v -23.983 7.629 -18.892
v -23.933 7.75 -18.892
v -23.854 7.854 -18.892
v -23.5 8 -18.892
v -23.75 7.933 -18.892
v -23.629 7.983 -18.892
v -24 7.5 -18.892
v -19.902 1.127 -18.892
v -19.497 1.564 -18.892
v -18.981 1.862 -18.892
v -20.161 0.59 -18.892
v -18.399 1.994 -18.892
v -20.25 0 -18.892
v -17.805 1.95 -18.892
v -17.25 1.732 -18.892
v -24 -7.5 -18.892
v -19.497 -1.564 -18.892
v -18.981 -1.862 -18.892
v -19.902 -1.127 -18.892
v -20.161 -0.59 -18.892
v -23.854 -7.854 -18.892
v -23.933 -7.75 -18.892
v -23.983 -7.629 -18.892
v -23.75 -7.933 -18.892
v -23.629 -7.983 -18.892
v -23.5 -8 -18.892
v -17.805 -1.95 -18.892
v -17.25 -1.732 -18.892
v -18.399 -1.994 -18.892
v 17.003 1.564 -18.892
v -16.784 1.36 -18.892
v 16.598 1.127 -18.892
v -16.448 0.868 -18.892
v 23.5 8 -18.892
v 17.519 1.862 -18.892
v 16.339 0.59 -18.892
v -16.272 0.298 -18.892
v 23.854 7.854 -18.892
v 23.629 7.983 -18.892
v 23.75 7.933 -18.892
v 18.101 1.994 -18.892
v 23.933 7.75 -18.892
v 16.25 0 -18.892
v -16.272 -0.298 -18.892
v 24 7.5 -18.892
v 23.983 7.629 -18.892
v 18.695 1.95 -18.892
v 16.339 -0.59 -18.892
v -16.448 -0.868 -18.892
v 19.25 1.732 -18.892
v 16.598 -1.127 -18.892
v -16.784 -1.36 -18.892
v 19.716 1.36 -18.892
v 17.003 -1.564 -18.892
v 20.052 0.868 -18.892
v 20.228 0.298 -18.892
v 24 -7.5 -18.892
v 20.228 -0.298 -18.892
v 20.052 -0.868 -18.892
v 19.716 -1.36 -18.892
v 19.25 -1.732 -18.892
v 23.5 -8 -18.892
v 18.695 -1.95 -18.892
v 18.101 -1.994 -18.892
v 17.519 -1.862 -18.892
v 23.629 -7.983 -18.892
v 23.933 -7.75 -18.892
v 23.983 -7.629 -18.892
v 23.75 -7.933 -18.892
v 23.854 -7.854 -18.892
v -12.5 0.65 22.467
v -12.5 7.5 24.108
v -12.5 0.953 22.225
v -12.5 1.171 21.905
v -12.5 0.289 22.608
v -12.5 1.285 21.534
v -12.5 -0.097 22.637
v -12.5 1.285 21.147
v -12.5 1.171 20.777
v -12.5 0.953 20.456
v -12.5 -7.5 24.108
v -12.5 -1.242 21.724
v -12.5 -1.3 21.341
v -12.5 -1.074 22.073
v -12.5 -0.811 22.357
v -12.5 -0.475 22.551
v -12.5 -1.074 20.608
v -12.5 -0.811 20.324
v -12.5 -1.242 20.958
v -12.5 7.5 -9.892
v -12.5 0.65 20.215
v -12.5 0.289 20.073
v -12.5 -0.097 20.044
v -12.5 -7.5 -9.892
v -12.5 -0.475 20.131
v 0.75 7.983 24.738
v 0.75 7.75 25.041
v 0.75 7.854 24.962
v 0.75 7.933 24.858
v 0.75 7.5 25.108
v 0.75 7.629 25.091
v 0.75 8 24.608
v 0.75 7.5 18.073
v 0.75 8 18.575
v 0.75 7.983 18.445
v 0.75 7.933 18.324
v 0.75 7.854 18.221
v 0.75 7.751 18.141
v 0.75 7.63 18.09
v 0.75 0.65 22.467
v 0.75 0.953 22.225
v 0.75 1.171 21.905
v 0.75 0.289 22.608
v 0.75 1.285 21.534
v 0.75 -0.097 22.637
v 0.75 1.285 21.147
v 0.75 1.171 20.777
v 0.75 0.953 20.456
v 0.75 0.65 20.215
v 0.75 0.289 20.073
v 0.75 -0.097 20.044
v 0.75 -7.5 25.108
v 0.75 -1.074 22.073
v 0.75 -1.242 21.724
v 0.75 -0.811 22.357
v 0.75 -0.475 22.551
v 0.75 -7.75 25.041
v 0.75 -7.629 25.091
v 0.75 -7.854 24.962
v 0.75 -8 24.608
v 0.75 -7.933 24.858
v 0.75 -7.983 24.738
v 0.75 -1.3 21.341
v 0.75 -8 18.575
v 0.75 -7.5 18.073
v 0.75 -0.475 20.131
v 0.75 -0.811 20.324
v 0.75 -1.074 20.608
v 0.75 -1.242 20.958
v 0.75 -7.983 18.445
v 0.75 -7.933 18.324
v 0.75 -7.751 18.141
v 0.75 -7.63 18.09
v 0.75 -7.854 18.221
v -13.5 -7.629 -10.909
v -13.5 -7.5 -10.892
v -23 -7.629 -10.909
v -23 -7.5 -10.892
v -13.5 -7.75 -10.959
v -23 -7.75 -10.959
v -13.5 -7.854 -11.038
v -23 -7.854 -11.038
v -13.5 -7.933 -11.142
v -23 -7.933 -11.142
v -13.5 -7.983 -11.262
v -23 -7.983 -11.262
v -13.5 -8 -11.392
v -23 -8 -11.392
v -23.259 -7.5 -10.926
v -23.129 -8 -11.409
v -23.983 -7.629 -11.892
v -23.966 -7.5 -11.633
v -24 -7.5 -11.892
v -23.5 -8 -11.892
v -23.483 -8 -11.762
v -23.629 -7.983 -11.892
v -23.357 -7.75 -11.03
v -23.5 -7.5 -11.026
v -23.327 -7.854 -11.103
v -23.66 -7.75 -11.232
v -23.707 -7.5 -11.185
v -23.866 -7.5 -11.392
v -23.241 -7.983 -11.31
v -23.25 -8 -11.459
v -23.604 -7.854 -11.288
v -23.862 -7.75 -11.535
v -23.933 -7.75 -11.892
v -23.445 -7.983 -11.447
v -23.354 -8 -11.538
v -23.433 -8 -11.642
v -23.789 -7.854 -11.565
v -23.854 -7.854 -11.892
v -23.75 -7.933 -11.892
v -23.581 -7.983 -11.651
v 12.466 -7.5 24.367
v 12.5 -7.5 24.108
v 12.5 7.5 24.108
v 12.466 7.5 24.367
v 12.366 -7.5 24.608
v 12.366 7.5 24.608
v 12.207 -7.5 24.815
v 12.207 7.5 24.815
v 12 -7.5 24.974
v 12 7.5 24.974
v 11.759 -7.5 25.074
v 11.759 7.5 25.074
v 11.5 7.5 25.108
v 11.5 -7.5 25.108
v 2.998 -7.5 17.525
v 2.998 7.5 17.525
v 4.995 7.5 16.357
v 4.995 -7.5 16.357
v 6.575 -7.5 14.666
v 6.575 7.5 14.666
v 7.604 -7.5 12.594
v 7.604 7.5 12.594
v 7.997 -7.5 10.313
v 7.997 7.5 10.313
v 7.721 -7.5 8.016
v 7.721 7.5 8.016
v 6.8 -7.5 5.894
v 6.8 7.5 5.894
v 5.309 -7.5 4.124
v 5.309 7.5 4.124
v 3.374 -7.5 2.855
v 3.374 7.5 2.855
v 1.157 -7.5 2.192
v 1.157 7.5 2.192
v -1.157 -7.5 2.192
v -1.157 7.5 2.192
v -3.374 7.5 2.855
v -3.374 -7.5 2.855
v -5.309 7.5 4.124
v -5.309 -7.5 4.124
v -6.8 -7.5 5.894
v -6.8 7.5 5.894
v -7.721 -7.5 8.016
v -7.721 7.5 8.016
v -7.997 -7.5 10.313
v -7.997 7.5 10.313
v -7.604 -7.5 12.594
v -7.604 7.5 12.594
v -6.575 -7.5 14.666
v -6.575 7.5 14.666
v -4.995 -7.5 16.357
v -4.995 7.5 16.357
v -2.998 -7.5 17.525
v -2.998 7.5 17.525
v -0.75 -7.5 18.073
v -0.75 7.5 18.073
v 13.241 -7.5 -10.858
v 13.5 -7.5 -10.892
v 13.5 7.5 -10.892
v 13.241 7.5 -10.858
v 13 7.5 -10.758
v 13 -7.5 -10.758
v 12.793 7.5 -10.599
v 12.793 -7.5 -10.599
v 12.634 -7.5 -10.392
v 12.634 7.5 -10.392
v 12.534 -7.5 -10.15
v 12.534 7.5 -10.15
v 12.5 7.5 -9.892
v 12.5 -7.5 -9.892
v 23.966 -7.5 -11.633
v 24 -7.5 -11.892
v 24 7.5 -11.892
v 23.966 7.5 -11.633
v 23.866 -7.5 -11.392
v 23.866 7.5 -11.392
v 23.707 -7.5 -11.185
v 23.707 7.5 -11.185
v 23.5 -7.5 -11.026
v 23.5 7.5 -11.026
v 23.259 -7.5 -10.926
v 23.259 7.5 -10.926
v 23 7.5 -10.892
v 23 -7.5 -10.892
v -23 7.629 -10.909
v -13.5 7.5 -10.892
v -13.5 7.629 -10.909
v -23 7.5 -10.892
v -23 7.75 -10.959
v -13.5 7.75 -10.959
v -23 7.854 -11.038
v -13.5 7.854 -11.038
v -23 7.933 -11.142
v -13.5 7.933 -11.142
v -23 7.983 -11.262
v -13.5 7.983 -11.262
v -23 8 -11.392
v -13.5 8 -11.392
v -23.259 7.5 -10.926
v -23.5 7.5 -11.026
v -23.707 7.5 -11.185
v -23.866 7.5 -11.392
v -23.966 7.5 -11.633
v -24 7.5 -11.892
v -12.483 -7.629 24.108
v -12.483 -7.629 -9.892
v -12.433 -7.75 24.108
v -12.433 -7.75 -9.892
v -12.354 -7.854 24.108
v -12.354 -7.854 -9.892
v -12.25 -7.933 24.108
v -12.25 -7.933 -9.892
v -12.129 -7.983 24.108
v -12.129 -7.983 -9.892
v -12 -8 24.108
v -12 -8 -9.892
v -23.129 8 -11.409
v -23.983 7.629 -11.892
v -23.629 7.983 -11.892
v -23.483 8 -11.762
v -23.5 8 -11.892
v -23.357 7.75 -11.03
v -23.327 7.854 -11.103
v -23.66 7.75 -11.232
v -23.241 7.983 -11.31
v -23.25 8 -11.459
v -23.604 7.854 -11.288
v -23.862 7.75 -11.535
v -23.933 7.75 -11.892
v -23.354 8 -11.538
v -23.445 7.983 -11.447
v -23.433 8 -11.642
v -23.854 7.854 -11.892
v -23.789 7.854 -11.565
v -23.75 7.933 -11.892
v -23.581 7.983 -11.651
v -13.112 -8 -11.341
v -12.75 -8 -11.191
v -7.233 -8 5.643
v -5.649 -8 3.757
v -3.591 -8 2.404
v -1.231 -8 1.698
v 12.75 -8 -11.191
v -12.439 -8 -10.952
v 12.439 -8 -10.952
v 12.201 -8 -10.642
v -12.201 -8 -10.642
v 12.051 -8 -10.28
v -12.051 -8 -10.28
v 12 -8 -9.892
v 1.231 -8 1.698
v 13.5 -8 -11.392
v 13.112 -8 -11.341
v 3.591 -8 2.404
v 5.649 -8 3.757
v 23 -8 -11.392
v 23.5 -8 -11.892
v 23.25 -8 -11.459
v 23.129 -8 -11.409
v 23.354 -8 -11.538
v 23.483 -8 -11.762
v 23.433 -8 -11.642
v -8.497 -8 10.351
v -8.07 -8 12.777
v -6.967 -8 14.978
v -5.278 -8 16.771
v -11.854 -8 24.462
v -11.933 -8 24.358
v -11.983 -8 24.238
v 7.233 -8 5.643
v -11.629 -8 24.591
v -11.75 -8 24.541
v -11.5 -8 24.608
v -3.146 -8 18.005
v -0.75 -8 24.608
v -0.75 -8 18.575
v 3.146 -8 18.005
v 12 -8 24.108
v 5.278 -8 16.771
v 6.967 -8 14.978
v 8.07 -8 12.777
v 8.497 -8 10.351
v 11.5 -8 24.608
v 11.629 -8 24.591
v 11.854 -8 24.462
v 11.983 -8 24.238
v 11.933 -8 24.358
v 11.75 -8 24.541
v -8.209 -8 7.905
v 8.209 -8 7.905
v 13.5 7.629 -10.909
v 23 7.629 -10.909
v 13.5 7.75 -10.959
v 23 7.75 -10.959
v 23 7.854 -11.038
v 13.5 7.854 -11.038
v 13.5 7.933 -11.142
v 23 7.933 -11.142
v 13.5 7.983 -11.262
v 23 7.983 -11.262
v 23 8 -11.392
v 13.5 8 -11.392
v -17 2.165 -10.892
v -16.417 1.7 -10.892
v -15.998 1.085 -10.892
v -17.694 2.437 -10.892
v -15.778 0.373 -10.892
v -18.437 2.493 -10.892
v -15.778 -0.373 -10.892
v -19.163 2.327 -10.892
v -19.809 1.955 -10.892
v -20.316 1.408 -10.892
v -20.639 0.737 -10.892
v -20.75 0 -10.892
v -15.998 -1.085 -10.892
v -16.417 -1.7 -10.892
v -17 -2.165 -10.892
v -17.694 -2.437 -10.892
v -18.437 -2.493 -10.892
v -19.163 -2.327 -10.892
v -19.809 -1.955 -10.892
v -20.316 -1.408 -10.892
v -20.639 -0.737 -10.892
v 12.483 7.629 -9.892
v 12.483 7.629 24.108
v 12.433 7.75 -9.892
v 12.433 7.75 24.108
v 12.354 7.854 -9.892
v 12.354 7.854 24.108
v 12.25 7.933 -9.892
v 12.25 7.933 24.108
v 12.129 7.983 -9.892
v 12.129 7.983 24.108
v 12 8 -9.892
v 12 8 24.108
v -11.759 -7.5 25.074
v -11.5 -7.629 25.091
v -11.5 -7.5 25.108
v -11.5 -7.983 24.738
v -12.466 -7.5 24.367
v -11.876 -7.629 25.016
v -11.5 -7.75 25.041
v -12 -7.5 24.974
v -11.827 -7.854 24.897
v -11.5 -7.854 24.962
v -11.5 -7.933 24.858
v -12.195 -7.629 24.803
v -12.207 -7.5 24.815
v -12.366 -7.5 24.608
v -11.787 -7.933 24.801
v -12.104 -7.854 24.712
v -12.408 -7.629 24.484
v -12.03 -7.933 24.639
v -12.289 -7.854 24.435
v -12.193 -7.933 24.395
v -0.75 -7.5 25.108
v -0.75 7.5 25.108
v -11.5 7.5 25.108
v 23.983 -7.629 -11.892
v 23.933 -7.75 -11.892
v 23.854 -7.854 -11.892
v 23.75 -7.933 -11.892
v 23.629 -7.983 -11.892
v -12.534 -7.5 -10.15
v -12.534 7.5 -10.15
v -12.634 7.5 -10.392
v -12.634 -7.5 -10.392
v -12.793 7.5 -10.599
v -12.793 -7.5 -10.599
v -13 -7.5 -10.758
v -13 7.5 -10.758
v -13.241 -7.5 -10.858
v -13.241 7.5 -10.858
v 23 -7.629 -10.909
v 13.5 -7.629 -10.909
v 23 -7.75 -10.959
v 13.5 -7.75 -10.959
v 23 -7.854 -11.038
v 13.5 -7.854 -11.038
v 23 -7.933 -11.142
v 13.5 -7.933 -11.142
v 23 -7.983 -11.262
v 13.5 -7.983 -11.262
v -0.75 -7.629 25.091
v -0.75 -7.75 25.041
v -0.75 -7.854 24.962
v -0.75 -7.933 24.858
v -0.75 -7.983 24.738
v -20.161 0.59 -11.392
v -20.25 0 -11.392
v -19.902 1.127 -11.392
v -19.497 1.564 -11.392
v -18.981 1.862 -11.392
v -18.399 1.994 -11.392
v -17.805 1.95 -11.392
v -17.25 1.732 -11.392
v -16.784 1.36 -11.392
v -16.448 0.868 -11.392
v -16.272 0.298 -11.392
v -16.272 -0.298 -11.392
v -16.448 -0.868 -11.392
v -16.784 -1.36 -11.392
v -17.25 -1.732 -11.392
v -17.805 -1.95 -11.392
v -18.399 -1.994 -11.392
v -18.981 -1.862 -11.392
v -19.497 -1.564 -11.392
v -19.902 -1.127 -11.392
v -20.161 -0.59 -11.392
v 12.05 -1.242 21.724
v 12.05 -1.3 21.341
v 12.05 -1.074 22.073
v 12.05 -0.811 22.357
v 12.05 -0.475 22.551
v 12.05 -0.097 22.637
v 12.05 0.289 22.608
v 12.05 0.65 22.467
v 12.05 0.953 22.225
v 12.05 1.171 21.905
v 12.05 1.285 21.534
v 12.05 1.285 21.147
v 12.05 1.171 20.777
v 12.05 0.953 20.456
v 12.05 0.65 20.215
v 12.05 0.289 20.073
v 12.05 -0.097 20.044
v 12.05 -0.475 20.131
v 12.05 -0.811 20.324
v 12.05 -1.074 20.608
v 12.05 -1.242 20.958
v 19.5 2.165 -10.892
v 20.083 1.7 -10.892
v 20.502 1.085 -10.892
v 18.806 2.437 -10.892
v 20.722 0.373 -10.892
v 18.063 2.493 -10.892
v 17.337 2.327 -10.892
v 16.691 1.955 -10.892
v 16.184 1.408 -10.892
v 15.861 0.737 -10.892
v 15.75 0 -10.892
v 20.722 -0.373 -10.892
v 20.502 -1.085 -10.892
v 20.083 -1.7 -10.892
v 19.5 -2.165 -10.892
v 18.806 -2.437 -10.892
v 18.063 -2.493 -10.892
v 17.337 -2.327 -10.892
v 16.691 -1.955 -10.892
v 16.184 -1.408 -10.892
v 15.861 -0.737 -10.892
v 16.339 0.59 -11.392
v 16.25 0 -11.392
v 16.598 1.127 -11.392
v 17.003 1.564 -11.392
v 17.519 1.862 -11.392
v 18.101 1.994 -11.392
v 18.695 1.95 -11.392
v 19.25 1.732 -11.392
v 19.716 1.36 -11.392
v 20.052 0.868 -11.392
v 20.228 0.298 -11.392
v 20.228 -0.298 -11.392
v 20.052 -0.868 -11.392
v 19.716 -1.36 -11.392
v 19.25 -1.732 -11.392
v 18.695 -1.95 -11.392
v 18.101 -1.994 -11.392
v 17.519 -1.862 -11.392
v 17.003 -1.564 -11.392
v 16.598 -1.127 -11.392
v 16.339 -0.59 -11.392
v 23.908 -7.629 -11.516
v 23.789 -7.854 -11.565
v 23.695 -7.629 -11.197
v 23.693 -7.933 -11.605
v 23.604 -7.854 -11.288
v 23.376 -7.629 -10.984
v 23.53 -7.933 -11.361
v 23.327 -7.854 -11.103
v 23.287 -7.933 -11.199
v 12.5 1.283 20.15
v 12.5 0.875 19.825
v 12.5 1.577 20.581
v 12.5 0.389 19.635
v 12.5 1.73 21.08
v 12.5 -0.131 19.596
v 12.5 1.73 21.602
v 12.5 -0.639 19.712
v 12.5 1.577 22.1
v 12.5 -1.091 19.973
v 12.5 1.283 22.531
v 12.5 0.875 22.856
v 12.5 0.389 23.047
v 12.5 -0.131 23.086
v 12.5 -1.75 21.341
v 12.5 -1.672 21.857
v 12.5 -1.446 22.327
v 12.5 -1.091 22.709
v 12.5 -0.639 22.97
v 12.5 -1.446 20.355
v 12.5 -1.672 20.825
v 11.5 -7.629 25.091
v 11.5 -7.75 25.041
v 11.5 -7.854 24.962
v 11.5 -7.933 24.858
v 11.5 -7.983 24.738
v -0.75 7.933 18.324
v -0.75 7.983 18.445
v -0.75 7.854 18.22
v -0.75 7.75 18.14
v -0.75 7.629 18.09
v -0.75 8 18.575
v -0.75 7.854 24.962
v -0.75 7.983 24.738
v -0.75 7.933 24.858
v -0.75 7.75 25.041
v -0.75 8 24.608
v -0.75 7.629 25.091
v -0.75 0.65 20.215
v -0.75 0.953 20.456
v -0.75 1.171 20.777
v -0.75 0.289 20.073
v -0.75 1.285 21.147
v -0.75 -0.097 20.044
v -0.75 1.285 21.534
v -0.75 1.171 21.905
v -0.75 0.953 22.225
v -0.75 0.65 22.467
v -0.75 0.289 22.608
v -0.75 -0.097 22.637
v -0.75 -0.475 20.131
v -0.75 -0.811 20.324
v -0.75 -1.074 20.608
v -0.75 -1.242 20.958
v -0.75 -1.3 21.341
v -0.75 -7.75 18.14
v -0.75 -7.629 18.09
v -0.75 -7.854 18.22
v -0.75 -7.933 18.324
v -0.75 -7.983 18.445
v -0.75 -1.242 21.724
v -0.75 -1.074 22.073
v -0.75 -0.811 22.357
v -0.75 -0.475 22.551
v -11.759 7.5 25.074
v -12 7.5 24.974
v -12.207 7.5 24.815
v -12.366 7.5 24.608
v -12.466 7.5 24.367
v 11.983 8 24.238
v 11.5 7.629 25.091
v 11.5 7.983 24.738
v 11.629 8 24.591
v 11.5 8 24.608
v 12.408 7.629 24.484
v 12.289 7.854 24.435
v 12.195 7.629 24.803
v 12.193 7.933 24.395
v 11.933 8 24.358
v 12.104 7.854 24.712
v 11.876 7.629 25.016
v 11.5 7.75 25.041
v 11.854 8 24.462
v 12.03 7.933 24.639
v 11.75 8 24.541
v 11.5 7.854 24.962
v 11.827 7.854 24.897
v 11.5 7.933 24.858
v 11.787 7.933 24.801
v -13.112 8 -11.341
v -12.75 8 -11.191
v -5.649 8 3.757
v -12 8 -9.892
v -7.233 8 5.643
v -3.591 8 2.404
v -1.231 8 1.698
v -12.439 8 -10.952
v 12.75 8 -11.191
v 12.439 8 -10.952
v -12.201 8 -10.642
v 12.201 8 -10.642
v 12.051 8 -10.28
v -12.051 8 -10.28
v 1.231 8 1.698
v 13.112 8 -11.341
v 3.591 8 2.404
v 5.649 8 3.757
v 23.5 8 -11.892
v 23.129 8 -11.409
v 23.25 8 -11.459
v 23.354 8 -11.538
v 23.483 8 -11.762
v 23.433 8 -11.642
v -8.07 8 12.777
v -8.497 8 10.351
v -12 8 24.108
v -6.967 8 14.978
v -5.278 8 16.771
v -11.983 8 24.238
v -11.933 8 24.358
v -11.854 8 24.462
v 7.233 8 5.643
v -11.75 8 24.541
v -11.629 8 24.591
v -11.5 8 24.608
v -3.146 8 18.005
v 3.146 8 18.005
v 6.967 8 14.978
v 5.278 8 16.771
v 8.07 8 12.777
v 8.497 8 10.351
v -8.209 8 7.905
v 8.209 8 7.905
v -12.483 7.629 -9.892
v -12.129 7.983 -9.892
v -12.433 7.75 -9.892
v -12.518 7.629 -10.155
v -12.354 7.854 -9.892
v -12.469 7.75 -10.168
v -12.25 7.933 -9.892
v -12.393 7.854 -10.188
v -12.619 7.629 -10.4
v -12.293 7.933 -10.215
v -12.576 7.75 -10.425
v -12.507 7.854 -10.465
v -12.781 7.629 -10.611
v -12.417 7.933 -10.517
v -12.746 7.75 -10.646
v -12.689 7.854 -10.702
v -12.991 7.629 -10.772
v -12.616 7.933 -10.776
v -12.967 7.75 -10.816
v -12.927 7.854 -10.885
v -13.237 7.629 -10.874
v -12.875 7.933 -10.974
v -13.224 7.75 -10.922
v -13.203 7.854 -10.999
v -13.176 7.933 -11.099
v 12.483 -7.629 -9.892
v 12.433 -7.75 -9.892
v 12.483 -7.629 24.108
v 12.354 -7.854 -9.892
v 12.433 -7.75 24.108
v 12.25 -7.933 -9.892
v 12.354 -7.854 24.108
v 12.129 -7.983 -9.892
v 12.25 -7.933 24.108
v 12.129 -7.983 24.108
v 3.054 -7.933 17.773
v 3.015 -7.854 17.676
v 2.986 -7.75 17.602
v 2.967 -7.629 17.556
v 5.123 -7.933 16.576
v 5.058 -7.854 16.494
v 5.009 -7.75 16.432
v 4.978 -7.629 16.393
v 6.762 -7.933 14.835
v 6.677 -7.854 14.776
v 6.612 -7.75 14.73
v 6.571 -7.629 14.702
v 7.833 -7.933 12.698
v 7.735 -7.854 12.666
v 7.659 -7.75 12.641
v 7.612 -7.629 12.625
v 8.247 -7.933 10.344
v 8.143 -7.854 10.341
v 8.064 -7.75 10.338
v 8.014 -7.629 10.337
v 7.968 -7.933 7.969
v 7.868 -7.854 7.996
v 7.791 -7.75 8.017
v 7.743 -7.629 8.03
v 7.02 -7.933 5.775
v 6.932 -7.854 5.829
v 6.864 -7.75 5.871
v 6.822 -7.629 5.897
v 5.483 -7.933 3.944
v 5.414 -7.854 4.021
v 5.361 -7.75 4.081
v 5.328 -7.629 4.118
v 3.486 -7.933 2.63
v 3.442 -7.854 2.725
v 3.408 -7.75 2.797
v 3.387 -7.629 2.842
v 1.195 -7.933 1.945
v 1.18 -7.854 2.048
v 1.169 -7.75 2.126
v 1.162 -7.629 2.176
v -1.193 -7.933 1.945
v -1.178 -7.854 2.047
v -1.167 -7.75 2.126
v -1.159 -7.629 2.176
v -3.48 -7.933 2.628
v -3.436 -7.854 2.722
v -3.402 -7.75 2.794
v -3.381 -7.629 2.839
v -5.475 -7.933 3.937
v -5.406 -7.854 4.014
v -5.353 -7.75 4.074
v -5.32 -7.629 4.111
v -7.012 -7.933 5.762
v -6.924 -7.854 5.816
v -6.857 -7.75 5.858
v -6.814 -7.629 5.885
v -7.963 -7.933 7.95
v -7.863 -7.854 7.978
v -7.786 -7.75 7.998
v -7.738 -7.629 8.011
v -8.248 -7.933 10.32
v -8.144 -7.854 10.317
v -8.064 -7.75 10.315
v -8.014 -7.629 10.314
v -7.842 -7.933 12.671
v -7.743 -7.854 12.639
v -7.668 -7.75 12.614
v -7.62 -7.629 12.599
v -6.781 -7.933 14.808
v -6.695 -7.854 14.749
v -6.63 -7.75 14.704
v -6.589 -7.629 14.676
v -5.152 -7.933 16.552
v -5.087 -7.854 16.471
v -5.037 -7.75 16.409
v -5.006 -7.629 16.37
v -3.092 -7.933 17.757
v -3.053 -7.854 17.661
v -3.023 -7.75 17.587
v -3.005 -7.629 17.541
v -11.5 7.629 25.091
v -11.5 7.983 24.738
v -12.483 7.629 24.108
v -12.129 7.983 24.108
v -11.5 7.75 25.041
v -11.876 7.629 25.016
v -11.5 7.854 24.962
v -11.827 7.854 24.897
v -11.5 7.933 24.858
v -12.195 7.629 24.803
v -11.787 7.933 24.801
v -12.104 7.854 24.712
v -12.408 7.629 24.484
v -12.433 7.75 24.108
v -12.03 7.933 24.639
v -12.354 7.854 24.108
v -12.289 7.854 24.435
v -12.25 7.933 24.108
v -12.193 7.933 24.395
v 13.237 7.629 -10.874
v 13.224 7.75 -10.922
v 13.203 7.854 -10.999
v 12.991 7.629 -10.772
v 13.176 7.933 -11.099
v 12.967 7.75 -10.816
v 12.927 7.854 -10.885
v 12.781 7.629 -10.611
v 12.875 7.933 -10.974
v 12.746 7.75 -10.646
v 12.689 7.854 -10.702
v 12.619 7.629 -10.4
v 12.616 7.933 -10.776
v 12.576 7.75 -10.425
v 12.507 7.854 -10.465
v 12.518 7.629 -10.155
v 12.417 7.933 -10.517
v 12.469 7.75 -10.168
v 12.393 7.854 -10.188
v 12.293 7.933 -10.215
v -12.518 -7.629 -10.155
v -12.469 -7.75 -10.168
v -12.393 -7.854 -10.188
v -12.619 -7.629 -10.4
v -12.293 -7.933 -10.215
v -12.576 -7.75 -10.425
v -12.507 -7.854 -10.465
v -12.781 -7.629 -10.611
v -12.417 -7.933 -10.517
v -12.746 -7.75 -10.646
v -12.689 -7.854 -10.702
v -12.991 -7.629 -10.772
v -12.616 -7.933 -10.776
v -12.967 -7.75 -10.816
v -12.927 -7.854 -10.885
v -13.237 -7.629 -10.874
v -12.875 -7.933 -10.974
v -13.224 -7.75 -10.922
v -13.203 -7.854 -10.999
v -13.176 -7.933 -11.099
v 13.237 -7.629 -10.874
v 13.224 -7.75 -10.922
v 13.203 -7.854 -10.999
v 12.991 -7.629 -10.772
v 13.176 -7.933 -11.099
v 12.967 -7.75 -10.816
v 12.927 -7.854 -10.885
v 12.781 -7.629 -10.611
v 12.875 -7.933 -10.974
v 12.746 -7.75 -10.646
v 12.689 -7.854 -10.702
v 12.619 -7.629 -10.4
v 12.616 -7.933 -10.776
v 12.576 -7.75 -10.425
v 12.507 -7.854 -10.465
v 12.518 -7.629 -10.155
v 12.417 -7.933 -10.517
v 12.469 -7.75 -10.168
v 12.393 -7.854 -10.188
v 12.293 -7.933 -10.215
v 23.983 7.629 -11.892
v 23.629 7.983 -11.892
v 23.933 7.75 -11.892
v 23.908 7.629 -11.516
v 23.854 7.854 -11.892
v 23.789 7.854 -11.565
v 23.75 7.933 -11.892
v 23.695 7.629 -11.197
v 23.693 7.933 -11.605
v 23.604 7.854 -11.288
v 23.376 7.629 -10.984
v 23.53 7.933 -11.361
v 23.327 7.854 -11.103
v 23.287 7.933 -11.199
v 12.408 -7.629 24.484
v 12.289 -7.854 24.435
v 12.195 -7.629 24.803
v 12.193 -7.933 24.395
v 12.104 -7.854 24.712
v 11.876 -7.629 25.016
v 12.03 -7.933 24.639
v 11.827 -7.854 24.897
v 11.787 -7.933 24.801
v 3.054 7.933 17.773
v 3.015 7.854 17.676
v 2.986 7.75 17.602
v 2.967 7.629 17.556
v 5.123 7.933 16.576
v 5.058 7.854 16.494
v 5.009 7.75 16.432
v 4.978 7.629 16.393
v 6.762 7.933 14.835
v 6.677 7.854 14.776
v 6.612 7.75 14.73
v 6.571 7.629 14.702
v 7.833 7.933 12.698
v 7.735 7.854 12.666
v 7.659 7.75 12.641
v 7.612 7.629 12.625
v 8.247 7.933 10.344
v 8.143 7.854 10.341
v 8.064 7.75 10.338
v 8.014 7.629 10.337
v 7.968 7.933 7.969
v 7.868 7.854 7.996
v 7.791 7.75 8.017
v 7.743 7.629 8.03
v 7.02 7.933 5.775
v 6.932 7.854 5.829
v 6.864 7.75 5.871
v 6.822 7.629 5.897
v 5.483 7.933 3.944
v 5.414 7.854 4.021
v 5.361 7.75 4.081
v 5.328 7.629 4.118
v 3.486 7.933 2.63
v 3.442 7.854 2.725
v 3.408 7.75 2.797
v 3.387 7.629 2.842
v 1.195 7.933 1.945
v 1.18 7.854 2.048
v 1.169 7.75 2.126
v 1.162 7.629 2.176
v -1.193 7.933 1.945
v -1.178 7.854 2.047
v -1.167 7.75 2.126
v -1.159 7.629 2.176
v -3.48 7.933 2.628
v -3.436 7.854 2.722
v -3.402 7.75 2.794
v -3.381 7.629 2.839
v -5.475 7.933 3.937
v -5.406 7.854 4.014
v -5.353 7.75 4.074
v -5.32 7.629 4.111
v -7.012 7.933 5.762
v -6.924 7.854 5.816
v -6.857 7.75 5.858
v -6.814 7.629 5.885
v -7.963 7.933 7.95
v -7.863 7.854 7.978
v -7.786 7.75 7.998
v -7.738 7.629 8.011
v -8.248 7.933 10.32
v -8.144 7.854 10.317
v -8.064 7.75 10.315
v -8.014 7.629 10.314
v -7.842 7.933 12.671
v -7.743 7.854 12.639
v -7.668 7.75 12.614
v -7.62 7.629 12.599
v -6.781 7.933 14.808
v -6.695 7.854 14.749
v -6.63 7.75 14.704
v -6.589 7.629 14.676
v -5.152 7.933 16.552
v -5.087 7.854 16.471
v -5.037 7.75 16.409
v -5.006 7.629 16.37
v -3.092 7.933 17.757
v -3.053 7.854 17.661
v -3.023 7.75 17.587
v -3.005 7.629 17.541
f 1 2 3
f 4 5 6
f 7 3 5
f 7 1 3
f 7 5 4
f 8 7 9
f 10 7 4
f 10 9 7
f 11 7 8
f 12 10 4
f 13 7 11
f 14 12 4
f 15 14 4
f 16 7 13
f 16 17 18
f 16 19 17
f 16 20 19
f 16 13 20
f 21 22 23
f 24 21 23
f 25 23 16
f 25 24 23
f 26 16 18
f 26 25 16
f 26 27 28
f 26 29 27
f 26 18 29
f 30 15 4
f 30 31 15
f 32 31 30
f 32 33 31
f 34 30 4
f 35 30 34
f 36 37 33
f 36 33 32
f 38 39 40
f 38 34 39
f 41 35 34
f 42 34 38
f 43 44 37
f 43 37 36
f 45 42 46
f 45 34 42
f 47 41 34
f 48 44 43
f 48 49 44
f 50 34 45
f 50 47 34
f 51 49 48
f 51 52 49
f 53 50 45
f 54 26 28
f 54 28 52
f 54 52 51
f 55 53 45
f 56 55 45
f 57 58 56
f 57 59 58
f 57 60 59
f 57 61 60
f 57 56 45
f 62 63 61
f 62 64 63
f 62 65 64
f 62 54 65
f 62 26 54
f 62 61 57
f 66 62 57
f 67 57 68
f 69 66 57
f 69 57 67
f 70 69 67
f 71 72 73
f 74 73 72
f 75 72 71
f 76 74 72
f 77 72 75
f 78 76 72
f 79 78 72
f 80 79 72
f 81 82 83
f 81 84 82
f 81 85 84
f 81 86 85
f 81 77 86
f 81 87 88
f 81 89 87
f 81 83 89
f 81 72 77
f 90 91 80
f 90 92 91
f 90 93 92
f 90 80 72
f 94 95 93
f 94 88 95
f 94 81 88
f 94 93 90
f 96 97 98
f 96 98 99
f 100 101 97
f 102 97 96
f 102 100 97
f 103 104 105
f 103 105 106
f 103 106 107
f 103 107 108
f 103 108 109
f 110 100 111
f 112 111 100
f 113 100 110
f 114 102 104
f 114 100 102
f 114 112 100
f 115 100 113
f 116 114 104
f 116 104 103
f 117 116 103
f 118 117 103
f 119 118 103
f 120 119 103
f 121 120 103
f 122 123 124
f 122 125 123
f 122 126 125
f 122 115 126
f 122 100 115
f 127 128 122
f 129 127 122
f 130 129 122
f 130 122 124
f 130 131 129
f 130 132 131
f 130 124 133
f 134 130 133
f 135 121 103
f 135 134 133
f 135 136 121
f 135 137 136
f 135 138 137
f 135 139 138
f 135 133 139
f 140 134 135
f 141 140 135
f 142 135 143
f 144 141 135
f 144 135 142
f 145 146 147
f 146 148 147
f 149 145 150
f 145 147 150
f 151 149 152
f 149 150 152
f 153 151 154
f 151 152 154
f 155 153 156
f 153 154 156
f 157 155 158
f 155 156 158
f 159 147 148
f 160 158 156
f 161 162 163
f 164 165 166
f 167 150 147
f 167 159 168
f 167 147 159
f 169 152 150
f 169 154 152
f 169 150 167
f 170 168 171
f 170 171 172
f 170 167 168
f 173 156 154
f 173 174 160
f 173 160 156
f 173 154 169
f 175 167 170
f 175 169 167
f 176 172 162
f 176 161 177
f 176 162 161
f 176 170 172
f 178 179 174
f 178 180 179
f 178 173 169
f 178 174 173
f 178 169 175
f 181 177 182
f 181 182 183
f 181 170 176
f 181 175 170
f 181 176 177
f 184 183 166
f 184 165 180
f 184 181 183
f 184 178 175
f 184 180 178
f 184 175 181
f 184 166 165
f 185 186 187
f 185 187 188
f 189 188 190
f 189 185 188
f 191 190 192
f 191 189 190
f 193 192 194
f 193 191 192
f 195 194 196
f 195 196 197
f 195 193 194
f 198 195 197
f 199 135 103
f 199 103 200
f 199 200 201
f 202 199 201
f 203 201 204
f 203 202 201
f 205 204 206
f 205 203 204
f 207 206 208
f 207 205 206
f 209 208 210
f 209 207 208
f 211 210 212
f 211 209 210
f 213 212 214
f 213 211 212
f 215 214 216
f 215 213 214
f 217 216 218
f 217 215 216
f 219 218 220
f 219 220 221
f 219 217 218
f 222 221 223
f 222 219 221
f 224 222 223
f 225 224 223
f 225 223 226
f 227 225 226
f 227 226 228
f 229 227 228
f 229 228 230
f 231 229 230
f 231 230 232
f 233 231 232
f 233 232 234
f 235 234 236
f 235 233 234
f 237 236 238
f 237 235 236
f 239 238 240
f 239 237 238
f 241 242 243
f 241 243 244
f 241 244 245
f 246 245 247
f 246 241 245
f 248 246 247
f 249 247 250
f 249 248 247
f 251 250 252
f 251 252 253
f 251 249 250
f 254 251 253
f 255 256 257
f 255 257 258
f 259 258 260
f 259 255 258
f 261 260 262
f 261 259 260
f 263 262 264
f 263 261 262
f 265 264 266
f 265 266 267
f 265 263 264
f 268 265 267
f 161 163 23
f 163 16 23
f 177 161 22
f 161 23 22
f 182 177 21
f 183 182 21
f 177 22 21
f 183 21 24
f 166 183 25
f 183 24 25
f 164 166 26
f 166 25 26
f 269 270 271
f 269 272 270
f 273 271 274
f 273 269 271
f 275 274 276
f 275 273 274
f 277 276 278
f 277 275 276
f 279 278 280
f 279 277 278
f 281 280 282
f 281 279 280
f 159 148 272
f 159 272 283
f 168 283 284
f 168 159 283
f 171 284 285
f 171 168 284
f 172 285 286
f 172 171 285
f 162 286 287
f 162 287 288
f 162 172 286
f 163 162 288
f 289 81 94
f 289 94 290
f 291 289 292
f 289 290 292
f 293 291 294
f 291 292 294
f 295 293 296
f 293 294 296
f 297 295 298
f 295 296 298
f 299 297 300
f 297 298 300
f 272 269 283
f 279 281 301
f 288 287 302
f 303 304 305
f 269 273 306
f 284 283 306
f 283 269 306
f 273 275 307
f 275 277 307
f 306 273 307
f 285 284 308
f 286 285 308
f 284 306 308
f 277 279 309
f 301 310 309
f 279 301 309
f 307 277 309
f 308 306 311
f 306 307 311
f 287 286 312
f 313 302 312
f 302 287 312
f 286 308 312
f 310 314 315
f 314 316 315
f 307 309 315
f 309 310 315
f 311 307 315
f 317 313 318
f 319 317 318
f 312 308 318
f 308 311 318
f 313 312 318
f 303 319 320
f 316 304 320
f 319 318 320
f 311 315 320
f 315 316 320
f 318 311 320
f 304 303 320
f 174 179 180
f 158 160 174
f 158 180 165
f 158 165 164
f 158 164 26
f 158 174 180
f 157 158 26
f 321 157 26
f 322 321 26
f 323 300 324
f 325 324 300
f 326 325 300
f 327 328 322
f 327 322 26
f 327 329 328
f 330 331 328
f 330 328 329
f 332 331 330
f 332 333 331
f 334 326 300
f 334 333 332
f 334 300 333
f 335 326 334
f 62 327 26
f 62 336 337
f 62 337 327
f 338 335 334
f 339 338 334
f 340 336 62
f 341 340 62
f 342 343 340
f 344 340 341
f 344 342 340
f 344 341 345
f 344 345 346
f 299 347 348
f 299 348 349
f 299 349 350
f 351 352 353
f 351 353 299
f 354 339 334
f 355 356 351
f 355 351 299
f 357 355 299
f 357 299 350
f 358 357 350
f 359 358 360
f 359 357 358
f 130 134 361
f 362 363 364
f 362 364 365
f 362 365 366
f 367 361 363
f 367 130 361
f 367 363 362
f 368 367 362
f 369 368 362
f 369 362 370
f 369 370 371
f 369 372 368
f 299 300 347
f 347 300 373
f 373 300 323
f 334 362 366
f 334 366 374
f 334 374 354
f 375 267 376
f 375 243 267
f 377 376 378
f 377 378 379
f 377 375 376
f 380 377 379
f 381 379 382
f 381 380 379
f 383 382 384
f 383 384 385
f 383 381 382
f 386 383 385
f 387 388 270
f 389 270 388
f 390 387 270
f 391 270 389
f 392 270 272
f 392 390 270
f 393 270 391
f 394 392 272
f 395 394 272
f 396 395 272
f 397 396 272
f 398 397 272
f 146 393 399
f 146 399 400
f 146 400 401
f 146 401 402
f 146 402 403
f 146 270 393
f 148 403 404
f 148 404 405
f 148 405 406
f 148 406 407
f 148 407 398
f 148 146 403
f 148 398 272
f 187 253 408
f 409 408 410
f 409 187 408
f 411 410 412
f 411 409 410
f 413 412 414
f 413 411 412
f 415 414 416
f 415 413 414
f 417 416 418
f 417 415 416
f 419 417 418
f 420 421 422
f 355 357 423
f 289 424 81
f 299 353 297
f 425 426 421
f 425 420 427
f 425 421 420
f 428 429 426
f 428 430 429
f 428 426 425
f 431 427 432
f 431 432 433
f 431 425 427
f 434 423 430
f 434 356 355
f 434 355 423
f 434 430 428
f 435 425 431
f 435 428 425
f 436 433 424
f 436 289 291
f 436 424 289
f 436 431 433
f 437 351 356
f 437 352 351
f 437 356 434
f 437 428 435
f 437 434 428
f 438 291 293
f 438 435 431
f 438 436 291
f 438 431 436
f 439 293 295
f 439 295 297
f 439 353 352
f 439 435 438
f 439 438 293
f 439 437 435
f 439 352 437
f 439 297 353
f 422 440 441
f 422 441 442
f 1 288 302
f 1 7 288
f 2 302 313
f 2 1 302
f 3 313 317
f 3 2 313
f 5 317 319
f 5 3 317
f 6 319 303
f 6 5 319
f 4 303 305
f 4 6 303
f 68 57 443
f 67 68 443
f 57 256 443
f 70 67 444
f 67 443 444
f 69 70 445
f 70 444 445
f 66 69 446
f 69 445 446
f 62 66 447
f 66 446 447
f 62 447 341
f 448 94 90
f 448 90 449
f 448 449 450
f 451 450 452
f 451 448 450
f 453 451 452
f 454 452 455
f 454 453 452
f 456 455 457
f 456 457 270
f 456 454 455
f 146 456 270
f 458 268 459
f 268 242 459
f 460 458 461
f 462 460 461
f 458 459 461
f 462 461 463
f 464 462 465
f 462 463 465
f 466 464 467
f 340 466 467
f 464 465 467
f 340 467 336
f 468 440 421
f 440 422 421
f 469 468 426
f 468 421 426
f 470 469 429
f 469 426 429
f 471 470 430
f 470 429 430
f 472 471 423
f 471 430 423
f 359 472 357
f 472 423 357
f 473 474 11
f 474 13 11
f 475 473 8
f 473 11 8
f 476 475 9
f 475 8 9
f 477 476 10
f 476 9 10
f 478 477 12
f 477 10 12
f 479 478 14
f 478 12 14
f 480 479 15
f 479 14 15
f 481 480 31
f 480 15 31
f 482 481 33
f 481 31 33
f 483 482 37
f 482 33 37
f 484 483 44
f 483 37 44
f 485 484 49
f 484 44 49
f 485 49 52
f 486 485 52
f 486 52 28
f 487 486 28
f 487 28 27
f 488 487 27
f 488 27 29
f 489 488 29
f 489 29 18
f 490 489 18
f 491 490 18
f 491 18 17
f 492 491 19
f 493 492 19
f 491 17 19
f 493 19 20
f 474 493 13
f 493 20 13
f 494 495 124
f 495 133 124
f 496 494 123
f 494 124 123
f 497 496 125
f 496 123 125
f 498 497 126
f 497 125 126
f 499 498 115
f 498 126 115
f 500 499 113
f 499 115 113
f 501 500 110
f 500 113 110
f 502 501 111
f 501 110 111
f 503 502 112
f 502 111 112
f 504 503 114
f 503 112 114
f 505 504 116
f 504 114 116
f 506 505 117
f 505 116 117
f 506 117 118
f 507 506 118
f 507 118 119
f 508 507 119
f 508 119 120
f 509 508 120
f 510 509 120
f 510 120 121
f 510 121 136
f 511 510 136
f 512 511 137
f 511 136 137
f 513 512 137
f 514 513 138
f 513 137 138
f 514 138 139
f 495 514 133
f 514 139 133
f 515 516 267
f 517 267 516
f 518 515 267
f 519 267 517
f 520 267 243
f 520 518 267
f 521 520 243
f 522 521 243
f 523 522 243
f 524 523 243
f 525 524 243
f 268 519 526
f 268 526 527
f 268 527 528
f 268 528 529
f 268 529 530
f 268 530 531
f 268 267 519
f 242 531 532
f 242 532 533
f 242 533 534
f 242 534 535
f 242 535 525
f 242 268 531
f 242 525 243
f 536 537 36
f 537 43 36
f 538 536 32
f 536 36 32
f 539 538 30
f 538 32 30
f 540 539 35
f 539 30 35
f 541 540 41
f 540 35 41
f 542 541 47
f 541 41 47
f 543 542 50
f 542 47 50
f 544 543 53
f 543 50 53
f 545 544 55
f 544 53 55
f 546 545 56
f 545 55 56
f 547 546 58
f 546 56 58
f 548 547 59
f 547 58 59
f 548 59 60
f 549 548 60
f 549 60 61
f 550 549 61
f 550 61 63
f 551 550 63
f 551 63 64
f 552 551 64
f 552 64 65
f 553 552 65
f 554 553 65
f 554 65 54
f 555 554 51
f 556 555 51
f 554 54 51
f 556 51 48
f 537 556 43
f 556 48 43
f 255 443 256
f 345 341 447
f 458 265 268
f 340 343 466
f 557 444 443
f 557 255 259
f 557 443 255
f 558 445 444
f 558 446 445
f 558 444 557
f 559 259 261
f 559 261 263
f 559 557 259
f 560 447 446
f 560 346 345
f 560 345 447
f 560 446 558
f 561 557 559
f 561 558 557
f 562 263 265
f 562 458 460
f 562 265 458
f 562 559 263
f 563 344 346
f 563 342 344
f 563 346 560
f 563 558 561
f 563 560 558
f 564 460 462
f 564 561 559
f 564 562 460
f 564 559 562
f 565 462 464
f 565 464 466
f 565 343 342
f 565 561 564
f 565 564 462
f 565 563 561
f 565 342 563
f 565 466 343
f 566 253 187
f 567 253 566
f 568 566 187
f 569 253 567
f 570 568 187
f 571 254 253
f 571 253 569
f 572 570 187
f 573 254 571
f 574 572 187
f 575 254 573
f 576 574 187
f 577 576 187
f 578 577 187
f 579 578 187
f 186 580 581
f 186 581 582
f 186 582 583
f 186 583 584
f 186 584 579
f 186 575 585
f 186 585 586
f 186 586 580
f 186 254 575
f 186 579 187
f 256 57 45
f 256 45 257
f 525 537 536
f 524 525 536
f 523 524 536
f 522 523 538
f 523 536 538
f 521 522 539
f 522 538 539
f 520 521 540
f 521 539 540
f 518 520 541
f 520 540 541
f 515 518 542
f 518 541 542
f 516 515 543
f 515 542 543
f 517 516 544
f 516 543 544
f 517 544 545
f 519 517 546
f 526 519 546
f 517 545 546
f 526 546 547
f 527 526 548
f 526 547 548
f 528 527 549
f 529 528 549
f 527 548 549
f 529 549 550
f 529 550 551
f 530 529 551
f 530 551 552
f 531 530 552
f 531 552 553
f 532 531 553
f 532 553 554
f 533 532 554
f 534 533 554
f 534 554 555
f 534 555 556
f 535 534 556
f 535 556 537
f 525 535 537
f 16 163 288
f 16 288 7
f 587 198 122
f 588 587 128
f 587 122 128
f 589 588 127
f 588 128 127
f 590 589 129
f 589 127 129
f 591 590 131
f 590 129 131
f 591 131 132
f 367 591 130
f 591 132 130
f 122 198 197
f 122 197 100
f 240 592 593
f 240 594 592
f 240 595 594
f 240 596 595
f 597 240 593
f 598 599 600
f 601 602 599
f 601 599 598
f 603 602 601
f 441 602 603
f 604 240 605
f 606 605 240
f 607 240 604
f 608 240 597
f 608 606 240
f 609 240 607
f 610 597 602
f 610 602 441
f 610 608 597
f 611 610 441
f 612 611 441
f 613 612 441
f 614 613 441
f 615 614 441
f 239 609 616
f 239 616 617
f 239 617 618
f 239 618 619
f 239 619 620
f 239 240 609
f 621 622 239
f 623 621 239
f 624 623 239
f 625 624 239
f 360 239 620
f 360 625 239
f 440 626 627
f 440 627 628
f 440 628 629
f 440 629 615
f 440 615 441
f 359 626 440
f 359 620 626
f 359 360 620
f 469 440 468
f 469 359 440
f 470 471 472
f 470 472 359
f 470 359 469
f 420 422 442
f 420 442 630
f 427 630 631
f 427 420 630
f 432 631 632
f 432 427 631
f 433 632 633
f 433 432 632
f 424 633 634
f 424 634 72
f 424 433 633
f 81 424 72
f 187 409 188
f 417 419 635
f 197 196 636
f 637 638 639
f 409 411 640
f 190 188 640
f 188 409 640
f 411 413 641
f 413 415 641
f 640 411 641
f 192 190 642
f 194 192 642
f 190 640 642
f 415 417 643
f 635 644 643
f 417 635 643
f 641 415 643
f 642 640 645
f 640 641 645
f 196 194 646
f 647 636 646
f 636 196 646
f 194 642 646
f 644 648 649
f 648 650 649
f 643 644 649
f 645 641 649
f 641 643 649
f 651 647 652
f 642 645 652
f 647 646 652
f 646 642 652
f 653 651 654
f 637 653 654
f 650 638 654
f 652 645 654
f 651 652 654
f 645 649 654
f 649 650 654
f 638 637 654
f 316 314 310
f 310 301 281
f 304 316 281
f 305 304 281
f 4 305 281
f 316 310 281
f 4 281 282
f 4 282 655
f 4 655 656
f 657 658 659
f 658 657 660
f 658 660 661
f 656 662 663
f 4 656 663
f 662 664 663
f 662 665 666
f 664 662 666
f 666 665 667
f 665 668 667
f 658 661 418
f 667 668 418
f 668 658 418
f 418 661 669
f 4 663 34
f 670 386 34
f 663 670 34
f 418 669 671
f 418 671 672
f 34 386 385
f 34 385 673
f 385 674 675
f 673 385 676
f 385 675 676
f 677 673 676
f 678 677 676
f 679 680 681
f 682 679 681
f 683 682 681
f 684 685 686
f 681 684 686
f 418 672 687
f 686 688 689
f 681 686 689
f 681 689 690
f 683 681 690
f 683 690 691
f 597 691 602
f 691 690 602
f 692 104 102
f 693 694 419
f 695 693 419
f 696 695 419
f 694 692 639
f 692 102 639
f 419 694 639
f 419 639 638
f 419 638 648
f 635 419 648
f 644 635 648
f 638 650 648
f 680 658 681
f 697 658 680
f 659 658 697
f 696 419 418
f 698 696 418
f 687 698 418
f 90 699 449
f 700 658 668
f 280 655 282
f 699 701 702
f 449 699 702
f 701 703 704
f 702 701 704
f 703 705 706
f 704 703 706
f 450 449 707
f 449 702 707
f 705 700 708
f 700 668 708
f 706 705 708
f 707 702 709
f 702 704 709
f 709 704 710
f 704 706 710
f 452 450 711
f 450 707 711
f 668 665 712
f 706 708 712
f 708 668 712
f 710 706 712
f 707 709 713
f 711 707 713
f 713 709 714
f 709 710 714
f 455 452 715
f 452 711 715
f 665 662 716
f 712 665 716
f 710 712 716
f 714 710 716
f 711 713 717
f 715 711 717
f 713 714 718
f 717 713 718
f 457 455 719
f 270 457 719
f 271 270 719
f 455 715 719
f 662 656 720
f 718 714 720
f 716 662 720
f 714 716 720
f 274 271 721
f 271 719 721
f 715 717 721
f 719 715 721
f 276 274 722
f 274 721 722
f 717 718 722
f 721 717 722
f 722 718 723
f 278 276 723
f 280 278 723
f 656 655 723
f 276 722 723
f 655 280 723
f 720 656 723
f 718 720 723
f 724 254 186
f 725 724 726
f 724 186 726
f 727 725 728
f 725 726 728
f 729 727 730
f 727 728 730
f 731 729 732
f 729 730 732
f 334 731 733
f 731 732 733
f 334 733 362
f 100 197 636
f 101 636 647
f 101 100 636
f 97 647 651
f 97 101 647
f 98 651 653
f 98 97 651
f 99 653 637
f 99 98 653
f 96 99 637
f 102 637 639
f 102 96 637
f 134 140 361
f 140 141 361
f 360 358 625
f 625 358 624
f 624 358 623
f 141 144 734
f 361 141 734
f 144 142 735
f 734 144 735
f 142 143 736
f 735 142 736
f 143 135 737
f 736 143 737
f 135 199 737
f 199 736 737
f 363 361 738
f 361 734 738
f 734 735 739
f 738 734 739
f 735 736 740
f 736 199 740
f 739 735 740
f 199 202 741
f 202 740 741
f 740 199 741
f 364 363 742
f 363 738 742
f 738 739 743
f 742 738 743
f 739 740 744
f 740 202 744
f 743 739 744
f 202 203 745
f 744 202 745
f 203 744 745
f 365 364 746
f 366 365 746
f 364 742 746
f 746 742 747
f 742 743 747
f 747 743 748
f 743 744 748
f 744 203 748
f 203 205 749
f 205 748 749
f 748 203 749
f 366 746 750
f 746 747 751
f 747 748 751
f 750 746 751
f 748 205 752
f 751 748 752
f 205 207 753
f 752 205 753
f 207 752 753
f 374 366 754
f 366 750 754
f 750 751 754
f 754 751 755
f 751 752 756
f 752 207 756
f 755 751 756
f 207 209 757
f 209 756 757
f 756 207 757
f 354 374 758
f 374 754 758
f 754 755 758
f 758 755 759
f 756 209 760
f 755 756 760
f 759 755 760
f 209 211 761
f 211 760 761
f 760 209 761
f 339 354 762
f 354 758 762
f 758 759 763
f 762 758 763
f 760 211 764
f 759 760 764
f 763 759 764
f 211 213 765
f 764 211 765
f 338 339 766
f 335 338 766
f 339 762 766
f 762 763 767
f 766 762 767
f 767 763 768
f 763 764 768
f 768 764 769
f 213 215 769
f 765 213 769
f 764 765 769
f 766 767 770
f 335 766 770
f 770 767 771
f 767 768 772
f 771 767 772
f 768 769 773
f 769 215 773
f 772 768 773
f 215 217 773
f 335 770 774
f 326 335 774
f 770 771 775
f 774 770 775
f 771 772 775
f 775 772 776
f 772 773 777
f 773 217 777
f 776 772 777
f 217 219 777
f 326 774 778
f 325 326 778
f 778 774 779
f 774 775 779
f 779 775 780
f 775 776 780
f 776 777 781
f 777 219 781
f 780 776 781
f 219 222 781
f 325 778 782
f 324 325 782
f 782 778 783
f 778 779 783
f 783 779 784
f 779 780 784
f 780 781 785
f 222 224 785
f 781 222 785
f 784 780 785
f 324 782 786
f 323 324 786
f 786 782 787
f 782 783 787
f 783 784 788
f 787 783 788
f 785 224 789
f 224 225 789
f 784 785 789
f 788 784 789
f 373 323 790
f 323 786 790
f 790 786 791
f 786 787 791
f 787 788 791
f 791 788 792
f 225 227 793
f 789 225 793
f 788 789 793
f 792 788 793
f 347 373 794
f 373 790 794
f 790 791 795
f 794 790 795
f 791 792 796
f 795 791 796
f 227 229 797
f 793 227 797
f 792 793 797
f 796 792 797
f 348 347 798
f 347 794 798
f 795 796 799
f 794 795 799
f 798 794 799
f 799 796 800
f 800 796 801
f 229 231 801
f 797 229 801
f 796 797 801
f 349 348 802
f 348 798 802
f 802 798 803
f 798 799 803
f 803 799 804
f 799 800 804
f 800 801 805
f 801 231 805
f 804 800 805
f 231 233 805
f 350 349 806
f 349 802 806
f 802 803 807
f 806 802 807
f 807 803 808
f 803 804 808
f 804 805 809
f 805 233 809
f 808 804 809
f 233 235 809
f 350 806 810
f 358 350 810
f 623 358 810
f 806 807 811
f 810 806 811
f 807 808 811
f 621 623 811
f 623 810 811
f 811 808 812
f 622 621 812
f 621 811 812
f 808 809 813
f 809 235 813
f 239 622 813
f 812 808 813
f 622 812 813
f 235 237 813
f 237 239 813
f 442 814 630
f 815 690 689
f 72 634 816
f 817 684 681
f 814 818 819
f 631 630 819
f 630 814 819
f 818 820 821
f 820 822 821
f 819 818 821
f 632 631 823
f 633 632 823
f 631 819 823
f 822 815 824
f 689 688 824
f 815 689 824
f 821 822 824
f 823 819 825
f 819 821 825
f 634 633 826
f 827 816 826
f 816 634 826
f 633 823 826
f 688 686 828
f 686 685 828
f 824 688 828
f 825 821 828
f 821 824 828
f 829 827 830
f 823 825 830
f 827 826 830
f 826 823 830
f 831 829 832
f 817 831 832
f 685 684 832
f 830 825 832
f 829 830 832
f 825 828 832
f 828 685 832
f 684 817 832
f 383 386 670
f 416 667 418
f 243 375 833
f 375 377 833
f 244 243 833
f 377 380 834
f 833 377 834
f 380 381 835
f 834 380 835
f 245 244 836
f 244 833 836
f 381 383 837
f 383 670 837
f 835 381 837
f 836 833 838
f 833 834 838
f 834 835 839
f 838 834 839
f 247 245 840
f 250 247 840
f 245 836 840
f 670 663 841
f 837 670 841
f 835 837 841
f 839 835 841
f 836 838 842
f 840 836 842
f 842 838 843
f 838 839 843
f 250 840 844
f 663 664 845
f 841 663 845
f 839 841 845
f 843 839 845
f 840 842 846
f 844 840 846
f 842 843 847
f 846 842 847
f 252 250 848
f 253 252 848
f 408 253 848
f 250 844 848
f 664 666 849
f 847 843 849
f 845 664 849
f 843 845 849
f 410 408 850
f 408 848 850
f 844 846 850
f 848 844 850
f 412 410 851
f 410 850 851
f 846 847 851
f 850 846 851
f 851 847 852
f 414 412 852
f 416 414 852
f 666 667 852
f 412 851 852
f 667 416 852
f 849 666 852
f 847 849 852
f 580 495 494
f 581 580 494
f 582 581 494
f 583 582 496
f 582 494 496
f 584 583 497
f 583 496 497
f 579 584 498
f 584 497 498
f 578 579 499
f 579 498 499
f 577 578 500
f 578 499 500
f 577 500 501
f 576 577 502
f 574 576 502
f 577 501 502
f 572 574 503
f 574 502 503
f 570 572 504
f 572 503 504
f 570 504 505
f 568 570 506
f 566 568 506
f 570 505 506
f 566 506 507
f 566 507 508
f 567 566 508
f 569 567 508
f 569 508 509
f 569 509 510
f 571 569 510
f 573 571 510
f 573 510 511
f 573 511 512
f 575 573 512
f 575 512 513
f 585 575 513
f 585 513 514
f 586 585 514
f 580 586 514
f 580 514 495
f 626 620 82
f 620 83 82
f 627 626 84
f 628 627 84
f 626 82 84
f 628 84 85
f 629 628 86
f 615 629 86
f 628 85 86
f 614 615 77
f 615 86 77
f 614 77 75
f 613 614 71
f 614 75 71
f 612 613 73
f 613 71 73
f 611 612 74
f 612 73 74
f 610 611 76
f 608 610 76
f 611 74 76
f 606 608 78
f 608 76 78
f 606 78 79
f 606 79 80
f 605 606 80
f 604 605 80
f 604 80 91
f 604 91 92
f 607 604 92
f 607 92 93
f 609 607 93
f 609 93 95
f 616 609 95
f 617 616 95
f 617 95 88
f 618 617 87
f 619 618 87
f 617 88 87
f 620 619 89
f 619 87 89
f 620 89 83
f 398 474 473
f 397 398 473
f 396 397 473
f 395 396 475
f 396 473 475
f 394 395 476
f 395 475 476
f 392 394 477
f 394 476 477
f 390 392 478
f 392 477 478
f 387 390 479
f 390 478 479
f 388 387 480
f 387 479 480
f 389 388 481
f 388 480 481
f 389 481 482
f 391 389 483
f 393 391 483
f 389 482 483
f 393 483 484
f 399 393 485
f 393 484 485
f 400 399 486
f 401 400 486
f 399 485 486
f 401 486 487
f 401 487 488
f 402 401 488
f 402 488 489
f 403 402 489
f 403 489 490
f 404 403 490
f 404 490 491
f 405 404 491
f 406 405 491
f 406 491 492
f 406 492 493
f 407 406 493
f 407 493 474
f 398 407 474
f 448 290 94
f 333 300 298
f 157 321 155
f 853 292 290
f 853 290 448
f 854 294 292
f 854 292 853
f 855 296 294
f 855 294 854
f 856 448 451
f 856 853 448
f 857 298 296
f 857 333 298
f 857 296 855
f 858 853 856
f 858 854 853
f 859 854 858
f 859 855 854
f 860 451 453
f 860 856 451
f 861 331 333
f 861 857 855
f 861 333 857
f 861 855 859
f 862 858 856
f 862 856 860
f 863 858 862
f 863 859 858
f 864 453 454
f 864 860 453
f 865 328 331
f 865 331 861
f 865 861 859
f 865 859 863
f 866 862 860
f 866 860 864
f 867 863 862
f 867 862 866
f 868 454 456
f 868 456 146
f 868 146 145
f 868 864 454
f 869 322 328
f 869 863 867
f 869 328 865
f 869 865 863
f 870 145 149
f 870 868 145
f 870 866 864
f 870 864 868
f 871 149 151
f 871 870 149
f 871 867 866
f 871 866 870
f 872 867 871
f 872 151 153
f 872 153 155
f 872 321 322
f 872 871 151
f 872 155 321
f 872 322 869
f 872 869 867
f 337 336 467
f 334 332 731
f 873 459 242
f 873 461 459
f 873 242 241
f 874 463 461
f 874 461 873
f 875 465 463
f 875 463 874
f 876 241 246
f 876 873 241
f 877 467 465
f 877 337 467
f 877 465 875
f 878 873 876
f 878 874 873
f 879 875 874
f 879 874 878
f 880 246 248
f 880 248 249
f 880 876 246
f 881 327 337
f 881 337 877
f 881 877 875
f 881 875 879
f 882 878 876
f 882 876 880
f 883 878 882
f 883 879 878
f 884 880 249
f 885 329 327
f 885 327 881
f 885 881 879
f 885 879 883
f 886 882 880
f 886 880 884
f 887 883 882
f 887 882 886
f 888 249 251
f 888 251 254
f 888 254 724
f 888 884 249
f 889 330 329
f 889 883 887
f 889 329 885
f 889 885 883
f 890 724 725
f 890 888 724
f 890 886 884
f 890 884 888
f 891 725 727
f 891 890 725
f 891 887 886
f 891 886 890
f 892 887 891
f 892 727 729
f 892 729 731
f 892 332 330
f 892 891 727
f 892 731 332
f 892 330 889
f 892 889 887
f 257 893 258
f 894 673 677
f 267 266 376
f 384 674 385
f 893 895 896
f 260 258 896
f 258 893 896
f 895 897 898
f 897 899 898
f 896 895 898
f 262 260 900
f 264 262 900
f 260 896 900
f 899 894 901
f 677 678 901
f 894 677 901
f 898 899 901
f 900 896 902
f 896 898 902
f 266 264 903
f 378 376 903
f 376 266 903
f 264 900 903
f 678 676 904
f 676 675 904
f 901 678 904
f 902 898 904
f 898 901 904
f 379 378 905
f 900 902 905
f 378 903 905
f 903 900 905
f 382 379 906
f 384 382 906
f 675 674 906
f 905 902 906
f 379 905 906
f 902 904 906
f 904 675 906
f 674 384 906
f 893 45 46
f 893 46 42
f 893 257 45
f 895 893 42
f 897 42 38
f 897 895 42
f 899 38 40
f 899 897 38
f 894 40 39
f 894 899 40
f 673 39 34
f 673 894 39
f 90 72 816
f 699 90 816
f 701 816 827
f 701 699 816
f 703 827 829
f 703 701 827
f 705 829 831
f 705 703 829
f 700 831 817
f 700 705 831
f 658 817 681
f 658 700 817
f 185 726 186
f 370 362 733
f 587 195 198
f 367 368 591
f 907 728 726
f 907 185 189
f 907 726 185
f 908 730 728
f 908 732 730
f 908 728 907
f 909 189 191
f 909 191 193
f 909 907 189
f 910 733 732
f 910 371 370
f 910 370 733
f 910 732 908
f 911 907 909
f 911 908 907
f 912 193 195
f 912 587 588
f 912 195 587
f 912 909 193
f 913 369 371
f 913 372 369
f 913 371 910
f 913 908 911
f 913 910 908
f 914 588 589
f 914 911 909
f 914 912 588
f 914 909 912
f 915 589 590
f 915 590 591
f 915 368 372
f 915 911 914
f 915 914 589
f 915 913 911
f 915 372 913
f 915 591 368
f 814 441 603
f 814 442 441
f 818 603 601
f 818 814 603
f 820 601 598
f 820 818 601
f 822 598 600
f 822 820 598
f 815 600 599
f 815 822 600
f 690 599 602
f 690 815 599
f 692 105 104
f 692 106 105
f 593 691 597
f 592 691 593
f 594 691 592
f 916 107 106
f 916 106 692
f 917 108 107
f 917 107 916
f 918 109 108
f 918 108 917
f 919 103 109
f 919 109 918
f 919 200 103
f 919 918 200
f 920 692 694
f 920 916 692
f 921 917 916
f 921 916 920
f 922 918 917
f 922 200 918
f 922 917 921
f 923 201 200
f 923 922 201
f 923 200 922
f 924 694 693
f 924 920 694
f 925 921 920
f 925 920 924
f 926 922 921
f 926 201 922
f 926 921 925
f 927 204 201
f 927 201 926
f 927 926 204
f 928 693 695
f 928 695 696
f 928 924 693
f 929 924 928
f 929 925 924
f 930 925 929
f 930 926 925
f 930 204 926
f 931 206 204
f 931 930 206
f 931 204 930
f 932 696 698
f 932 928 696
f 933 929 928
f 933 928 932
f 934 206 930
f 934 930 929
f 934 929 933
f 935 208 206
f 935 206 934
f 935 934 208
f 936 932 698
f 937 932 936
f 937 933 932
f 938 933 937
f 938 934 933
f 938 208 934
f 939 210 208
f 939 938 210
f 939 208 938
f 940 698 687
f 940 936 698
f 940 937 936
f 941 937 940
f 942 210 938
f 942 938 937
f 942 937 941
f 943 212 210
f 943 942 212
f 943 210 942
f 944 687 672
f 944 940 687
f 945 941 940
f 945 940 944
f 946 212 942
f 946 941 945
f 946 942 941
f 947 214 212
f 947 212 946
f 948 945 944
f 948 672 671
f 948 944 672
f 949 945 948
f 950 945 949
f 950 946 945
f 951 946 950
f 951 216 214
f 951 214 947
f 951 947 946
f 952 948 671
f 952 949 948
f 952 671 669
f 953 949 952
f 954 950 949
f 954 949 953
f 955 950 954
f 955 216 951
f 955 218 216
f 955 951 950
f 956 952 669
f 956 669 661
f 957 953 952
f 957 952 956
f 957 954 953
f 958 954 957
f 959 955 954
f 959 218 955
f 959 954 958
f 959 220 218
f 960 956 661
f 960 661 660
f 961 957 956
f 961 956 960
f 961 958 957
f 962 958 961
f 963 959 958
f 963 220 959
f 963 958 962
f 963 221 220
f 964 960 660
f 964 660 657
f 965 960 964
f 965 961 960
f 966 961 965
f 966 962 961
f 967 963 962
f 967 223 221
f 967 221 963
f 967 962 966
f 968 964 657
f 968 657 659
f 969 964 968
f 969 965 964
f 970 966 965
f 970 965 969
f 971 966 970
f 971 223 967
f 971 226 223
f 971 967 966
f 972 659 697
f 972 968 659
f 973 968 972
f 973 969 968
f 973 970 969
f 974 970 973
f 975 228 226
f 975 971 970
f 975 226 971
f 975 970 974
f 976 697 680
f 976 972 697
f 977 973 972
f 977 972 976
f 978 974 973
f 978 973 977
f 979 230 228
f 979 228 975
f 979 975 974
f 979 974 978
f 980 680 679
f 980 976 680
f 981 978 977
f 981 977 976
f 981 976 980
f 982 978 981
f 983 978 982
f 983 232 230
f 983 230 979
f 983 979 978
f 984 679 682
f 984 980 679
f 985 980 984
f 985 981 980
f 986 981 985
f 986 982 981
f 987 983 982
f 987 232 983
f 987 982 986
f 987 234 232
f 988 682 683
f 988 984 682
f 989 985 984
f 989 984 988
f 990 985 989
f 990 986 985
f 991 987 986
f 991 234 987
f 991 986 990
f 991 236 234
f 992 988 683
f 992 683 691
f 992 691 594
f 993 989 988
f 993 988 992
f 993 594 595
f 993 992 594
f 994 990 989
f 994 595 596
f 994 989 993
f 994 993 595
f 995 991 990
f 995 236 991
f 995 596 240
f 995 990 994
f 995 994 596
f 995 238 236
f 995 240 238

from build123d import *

# Parameters (mm, degrees)
F1_DEPTH       = 8
F2_R           = 0.5
F3_R           = 0.5
F5_D           = 4
F5_CSINK_D     = 5
F5_CSINK_ANGLE = 90
F7_D           = 2.6
F7_CSINK_D     = 3.5
F7_CSINK_ANGLE = 90


with BuildPart() as f1:
    # F0 (on Front) → F1 (new body, symmetric)
    with BuildSketch(Plane.XZ):
        with BuildLine():
            Line((-24, -18.891666), (24, -18.891666))
            Line((24, -18.891666), (24, -11.891666))
            ThreePointArc((24, -11.891666), (23.707107, -11.184559), (23, -10.891666))
            Line((23, -10.891666), (13.5, -10.891666))
            ThreePointArc((13.5, -10.891666), (12.792893, -10.598773), (12.5, -9.891666))
            Line((12.5, -9.891666), (12.5, 24.108334))
            ThreePointArc((12.5, 24.108334), (12.207107, 24.815441), (11.5, 25.108334))
            Line((11.5, 25.108334), (0.75, 25.108334))
            Line((0.75, 25.108334), (0.75, 18.0731))
            ThreePointArc((0.75, 18.0731), (0, 2.108334), (-0.75, 18.0731))
            Line((-0.75, 18.0731), (-0.75, 25.108334))
            Line((-0.75, 25.108334), (-11.5, 25.108334))
            ThreePointArc((-11.5, 25.108334), (-12.207107, 24.815441), (-12.5, 24.108334))
            Line((-12.5, 24.108334), (-12.5, -9.891666))
            ThreePointArc((-12.5, -9.891666), (-12.792893, -10.598773), (-13.5, -10.891666))
            Line((-13.5, -10.891666), (-23, -10.891666))
            ThreePointArc((-23, -10.891666), (-23.707107, -11.184559), (-24, -11.891666))
            Line((-24, -11.891666), (-24, -18.891666))
        make_face()
    extrude(amount=F1_DEPTH, both=True)

    # F2
    f2_edges = [f1.edges().sort_by_distance(p)[0] for p in [
        (12.5, -8, 7.108334),
        (-12.5, -8, 7.108334),
        (-12.5, 8, 7.108334),
        (12.5, 8, 7.108334),
    ]]
    fillet(f2_edges, radius=F2_R)

    # F3
    f3_edges = [f1.edges().sort_by_distance(p)[0] for p in [
        (0, -8, 2.108334),
        (0, 8, 2.108334),
    ]]
    fillet(f3_edges, radius=F3_R)

    # F5 (through all)
    with Locations(Plane.XY.offset(-10.891666)):
        with Locations((-18.25, 0), (18.25, 0)):
            CounterSinkHole(F5_D / 2, F5_CSINK_D / 2, counter_sink_angle=F5_CSINK_ANGLE)

    # F7 (through all)
    with Locations(Plane.YZ.offset(12.5)):
        with Locations((0, 21.340717)):
            CounterSinkHole(F7_D / 2, F7_CSINK_D / 2, counter_sink_angle=F7_CSINK_ANGLE)


solid = f1.part
